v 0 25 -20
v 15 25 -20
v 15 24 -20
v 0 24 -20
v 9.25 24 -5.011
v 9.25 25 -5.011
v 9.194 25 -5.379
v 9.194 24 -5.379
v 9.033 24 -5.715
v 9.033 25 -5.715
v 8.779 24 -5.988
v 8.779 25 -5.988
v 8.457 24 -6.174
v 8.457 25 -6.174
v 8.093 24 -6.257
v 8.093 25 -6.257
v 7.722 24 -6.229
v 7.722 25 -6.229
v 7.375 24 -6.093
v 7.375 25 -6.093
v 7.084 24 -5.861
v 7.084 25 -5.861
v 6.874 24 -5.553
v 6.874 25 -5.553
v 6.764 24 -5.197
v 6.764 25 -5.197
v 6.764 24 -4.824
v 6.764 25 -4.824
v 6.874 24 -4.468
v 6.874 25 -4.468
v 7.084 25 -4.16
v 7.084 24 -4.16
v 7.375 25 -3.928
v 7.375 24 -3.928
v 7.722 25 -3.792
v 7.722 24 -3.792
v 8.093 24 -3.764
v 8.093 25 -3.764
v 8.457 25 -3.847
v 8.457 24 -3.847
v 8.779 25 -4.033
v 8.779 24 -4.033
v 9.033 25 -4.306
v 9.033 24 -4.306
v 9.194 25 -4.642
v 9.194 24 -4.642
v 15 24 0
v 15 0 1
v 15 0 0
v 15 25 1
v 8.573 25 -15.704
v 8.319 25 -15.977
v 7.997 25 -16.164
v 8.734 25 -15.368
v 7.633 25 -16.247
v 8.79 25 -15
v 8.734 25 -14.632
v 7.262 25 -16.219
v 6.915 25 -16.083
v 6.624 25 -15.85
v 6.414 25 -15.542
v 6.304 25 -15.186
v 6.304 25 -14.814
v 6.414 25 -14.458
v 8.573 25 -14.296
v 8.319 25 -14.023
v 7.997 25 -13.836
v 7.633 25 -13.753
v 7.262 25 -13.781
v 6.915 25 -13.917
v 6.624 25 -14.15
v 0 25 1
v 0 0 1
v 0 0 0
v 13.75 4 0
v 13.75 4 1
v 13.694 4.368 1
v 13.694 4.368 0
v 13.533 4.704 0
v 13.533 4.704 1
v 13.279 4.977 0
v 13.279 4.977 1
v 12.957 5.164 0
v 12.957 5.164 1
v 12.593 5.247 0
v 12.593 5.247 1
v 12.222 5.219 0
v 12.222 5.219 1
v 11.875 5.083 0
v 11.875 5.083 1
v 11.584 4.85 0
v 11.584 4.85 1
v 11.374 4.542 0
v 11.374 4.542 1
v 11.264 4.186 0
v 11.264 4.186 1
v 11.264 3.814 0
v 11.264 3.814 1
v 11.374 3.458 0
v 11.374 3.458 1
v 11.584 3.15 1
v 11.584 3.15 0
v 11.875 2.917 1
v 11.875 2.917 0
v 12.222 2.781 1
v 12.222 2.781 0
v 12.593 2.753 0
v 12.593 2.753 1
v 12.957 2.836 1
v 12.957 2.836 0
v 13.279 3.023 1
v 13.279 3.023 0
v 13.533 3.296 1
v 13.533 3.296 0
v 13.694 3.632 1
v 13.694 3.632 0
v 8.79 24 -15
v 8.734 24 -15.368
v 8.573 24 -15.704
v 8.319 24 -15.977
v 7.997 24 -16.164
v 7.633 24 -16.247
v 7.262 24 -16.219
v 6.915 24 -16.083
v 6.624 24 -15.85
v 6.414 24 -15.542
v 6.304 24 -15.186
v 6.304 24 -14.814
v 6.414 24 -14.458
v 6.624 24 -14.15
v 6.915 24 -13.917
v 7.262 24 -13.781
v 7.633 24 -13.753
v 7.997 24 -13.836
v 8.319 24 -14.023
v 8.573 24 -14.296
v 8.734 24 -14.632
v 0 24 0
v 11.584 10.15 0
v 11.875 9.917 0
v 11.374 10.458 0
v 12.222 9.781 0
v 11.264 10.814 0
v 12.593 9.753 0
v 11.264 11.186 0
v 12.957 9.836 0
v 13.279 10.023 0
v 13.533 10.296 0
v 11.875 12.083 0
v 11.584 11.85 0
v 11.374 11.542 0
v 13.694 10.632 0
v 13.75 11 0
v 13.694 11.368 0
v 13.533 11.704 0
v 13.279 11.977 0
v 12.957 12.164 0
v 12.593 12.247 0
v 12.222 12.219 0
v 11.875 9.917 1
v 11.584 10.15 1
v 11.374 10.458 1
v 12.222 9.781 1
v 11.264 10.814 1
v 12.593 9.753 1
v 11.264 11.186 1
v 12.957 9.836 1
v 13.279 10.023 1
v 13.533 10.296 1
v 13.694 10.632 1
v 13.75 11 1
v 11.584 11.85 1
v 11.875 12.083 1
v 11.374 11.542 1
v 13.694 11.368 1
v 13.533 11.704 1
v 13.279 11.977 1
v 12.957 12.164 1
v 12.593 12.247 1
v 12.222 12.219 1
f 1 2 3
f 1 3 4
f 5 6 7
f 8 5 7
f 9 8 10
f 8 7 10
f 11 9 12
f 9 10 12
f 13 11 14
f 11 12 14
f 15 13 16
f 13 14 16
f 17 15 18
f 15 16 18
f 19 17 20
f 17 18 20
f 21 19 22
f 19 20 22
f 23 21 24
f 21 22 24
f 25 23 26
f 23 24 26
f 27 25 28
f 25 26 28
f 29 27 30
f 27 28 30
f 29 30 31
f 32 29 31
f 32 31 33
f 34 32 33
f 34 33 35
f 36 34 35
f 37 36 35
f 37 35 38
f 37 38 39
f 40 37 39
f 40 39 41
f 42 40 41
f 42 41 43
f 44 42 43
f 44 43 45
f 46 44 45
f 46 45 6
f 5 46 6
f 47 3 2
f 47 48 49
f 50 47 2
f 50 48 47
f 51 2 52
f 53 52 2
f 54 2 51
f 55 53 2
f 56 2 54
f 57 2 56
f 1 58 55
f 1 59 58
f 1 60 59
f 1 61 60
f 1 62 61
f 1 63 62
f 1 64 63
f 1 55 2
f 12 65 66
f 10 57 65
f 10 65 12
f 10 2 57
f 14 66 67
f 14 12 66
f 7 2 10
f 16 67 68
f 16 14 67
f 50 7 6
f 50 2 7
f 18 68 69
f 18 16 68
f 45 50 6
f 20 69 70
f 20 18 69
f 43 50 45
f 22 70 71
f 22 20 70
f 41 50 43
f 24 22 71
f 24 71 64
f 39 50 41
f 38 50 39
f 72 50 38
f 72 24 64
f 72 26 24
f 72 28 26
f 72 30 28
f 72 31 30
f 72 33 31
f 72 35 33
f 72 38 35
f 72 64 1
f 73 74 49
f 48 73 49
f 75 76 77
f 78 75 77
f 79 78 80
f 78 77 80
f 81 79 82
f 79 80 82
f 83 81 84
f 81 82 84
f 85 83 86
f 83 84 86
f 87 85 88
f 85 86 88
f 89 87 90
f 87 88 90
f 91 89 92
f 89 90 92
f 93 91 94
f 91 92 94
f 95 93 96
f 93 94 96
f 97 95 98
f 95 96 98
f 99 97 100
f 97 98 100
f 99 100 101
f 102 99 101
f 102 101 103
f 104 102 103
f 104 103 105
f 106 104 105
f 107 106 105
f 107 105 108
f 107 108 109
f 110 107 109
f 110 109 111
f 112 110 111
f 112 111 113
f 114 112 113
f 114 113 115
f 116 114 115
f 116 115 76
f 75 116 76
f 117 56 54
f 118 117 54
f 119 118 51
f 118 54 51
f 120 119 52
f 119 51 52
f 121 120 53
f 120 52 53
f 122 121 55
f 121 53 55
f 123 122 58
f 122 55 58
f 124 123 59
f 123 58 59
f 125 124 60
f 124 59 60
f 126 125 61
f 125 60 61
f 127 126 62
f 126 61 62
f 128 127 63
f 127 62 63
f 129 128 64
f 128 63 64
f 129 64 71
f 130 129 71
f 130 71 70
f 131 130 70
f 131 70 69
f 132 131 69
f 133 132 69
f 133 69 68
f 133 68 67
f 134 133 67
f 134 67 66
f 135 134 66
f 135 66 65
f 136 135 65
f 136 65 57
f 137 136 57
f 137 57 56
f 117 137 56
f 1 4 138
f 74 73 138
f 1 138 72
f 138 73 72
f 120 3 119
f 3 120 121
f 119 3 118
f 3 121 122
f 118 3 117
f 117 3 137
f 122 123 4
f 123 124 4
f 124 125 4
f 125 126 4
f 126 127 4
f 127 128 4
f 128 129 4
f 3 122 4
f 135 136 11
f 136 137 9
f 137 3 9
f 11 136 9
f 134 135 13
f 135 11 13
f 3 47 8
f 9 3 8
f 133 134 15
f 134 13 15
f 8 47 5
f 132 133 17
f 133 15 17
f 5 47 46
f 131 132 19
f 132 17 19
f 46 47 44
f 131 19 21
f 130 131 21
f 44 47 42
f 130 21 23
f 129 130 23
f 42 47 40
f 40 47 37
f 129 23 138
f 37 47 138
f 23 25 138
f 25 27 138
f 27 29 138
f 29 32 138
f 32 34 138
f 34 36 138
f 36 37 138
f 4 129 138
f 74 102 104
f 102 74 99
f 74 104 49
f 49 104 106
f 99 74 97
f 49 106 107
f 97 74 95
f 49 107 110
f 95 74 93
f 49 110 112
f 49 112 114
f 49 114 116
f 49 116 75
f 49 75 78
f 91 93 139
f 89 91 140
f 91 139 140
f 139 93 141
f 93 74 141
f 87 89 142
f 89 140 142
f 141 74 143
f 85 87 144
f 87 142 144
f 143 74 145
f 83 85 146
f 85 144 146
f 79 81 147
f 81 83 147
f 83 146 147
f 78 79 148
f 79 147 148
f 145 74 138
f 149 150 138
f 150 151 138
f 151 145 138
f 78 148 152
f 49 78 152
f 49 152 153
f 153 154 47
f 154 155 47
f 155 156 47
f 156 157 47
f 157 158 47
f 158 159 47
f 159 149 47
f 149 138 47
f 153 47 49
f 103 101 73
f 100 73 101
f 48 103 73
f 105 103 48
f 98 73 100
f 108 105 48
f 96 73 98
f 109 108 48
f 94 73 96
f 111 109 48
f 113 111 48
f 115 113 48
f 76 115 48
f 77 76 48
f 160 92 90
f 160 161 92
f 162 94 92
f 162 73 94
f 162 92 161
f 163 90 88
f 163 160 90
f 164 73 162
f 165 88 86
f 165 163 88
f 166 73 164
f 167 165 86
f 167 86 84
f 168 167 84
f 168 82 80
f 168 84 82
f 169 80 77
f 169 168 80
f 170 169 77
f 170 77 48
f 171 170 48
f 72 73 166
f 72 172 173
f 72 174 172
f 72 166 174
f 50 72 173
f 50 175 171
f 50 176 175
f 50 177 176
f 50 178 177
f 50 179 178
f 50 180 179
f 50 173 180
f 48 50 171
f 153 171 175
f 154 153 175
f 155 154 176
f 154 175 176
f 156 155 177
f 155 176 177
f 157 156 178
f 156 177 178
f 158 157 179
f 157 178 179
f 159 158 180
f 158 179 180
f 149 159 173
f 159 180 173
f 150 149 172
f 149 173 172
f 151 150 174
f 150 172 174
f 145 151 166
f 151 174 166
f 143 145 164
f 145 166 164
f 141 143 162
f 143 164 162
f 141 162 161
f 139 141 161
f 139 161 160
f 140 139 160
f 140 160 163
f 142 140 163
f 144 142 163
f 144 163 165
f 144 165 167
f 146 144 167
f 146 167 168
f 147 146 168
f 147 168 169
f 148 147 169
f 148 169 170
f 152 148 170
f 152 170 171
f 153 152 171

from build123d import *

# Parameters (mm, degrees)
SKETCH_1_W      = 15
SKETCH_1_H      = 25
EXTRUDE_1_DEPTH = 1
M3X0_5_1_D      = 2.5
M3X0_5_1_DEPTH  = 8.5
M3X0_5_1_TIP    = 0.751075774
SKETCH_4_W      = 15
SKETCH_4_H      = 1
EXTRUDE_2_DEPTH = 20
M3X0_5_2_D      = 2.5
M3X0_5_2_DEPTH  = 8.5
M3X0_5_2_TIP    = 0.751075774


with BuildPart() as part:
    # ｽｹｯﾁ1 → ﾎﾞｽ - 押し出し1 (new body)
    with BuildSketch(Plane.XY):
        with Locations((7.5, 12.5)):
            Rectangle(SKETCH_1_W, SKETCH_1_H)
    extrude(amount=EXTRUDE_1_DEPTH)

    # M3x0.5 ねじ穴1
    with Locations(Plane(origin=(0, 0, 0), x_dir=(-1, 0, 0), z_dir=(0, 0, -1))):
        with Locations((-12.5, 11), (-12.5, 4)):
            Hole(M3X0_5_1_D / 2, depth=M3X0_5_1_DEPTH)
            with Locations((0, 0, -(M3X0_5_1_DEPTH + M3X0_5_1_TIP / 2))):  # 118° drill point
                Cone(0, M3X0_5_1_D / 2, M3X0_5_1_TIP, mode=Mode.SUBTRACT)

    # ｽｹｯﾁ4 → ﾎﾞｽ - 押し出し2 (add)
    with BuildSketch(Plane(origin=(0, 0, 0), x_dir=(-1, 0, 0), z_dir=(0, 0, -1))):
        with Locations((-7.5, 24.5)):
            Rectangle(SKETCH_4_W, SKETCH_4_H)
    extrude(amount=EXTRUDE_2_DEPTH)

    # M3x0.5 ねじ穴2
    with Locations(Plane(origin=(0, 24, 0), x_dir=(-1, 0, 0), z_dir=(0, -1, 0))):
        with Locations((-8, 5.010585189), (-7.540008994, 15)):
            Hole(M3X0_5_2_D / 2, depth=M3X0_5_2_DEPTH)
            with Locations((0, 0, -(M3X0_5_2_DEPTH + M3X0_5_2_TIP / 2))):  # 118° drill point
                Cone(0, M3X0_5_2_D / 2, M3X0_5_2_TIP, mode=Mode.SUBTRACT)


solid = part.part
